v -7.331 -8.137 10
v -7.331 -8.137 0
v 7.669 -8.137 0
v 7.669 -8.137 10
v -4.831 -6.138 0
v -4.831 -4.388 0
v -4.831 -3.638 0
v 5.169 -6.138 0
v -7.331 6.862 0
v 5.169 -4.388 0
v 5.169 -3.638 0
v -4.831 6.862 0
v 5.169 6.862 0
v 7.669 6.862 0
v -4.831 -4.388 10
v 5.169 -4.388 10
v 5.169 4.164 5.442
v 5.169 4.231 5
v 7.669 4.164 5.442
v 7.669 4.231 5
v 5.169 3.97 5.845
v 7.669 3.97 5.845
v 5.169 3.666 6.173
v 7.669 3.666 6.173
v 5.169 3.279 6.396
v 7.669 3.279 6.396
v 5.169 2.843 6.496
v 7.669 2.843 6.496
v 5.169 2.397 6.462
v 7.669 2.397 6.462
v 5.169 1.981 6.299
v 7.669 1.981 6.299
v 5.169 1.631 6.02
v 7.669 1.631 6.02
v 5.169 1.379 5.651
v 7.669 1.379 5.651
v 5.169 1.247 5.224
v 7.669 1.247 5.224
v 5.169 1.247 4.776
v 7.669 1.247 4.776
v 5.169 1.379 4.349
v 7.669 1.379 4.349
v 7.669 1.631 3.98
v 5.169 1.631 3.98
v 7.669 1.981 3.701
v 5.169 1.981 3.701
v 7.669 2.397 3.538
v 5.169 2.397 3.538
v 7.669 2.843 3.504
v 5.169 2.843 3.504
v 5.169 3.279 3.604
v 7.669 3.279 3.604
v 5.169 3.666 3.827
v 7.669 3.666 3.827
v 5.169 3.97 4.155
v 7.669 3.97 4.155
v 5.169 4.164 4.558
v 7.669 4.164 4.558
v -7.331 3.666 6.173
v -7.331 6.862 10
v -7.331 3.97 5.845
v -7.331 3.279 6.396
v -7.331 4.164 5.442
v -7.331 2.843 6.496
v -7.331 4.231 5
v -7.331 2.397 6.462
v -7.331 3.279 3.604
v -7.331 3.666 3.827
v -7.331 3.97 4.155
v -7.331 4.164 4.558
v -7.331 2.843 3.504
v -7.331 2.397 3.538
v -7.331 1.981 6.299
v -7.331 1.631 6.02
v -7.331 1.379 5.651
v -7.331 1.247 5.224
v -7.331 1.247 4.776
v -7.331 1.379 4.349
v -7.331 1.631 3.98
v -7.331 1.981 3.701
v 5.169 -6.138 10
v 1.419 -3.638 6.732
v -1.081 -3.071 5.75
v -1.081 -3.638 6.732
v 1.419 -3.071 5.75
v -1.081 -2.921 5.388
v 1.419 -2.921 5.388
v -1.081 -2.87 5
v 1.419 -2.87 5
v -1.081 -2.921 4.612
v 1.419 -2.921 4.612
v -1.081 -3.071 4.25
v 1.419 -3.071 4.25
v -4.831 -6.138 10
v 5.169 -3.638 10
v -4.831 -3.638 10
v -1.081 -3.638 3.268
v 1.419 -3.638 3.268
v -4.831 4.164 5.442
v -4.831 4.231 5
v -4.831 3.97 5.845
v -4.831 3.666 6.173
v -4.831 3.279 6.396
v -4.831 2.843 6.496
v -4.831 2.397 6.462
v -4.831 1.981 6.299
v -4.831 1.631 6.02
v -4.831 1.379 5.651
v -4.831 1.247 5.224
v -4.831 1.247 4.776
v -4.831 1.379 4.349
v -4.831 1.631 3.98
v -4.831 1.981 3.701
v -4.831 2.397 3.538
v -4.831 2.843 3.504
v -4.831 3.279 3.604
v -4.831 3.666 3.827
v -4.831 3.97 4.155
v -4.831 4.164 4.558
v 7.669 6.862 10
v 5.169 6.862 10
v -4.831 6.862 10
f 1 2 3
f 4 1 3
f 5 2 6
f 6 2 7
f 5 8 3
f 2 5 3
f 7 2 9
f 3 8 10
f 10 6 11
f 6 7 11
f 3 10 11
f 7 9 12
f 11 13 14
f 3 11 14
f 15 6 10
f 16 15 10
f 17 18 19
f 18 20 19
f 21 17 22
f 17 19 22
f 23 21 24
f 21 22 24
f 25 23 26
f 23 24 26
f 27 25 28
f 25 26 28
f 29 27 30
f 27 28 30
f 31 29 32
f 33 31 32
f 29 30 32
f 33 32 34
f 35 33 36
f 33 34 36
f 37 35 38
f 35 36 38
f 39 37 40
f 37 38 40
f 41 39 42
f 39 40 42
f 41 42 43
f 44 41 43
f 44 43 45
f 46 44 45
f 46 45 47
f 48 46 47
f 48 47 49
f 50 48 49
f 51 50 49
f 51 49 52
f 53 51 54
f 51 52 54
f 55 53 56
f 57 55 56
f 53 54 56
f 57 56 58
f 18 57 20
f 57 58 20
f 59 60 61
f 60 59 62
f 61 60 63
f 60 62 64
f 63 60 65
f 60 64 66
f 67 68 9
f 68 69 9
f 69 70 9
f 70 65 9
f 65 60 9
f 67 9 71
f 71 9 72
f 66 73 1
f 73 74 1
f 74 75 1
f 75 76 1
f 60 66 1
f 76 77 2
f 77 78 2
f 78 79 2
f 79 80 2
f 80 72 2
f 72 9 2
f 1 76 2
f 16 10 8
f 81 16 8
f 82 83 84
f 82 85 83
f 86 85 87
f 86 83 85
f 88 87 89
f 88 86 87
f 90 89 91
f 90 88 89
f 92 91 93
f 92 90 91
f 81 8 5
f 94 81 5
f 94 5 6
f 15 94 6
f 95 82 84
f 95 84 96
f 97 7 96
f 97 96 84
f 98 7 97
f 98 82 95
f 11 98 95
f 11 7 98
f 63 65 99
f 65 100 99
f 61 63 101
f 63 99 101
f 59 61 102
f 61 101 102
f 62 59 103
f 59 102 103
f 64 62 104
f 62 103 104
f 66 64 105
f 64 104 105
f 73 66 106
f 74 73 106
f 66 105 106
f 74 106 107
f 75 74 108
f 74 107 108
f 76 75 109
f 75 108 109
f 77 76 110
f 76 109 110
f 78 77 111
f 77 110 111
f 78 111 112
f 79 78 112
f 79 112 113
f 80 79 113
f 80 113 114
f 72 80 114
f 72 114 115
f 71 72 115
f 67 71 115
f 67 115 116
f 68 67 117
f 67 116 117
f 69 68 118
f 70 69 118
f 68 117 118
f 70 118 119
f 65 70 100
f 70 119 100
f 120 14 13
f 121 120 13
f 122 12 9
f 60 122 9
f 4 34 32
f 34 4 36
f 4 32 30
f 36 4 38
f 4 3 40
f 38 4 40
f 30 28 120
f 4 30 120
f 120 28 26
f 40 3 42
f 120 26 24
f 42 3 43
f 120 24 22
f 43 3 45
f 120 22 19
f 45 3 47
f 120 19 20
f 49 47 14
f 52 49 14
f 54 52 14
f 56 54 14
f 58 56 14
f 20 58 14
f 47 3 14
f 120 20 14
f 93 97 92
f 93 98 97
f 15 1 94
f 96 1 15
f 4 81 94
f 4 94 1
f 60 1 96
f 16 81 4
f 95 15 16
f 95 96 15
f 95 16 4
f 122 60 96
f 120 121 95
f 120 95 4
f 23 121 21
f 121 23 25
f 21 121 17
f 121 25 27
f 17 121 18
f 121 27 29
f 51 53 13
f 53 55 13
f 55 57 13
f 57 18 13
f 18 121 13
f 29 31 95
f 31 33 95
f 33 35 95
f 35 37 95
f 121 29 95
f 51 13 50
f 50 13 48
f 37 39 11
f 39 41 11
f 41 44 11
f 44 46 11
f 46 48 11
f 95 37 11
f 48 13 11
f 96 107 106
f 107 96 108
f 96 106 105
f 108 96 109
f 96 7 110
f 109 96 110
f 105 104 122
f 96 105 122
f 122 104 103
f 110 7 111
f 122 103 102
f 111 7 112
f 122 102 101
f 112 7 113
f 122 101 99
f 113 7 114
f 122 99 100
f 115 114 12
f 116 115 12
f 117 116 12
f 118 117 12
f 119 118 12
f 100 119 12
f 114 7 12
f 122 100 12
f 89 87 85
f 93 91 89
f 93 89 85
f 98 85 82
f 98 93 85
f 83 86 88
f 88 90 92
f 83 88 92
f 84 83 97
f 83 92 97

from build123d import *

# Parameters (mm, degrees)
SKETCH1_W           = 10
SKETCH1_H           = 1.75
BOSS_EXTRUDE1_DEPTH = 10
BOSS_EXTRUDE2_DEPTH = 1.25
SKETCH2_5_R         = 1.5
CUT_EXTRUDE1_DEPTH  = 25
FILLET1_R           = 1.5


with BuildPart() as part:
    # Sketch1 → Boss-Extrude1 (new body)
    with BuildSketch(Plane.XY):
        Polygon((-4.83125, 6.8625), (-7.33125, 6.8625), (-7.33125, -8.1375), (7.66875, -8.1375), (7.66875, 6.8625), (5.16875, 6.8625), (5.16875, -3.6375), (-4.83125, -3.6375), align=None)
        with Locations((0.16875, -5.2625)):
            Rectangle(SKETCH1_W, SKETCH1_H, mode=Mode.SUBTRACT)
    extrude(amount=BOSS_EXTRUDE1_DEPTH)

    # Sketch2 → Boss-Extrude2 (add, symmetric)
    with BuildSketch(Plane(origin=(0.16875, 0, 0), x_dir=(0, 0, -1), z_dir=(1, 0, 0))):
        Polygon((-5, -2.6375), (-6.732050808, -3.6375), (-3.267949192, -3.6375), align=None)
    extrude(amount=BOSS_EXTRUDE2_DEPTH, both=True)

    # Sketch2<5> → Cut-Extrude1 (cut, symmetric)
    with BuildSketch(Plane(origin=(0.16875, 0, 0), x_dir=(0, 0, -1), z_dir=(1, 0, 0))):
        with Locations((-5, 2.730596766)):
            Circle(SKETCH2_5_R)
    extrude(amount=CUT_EXTRUDE1_DEPTH, both=True, mode=Mode.SUBTRACT)

    # Fillet1
    fillet1_edges = [part.edges().sort_by_distance(p)[0] for p in [
        (0.16875, -2.6375, 5),
    ]]
    fillet(fillet1_edges, radius=FILLET1_R)


solid = part.part
